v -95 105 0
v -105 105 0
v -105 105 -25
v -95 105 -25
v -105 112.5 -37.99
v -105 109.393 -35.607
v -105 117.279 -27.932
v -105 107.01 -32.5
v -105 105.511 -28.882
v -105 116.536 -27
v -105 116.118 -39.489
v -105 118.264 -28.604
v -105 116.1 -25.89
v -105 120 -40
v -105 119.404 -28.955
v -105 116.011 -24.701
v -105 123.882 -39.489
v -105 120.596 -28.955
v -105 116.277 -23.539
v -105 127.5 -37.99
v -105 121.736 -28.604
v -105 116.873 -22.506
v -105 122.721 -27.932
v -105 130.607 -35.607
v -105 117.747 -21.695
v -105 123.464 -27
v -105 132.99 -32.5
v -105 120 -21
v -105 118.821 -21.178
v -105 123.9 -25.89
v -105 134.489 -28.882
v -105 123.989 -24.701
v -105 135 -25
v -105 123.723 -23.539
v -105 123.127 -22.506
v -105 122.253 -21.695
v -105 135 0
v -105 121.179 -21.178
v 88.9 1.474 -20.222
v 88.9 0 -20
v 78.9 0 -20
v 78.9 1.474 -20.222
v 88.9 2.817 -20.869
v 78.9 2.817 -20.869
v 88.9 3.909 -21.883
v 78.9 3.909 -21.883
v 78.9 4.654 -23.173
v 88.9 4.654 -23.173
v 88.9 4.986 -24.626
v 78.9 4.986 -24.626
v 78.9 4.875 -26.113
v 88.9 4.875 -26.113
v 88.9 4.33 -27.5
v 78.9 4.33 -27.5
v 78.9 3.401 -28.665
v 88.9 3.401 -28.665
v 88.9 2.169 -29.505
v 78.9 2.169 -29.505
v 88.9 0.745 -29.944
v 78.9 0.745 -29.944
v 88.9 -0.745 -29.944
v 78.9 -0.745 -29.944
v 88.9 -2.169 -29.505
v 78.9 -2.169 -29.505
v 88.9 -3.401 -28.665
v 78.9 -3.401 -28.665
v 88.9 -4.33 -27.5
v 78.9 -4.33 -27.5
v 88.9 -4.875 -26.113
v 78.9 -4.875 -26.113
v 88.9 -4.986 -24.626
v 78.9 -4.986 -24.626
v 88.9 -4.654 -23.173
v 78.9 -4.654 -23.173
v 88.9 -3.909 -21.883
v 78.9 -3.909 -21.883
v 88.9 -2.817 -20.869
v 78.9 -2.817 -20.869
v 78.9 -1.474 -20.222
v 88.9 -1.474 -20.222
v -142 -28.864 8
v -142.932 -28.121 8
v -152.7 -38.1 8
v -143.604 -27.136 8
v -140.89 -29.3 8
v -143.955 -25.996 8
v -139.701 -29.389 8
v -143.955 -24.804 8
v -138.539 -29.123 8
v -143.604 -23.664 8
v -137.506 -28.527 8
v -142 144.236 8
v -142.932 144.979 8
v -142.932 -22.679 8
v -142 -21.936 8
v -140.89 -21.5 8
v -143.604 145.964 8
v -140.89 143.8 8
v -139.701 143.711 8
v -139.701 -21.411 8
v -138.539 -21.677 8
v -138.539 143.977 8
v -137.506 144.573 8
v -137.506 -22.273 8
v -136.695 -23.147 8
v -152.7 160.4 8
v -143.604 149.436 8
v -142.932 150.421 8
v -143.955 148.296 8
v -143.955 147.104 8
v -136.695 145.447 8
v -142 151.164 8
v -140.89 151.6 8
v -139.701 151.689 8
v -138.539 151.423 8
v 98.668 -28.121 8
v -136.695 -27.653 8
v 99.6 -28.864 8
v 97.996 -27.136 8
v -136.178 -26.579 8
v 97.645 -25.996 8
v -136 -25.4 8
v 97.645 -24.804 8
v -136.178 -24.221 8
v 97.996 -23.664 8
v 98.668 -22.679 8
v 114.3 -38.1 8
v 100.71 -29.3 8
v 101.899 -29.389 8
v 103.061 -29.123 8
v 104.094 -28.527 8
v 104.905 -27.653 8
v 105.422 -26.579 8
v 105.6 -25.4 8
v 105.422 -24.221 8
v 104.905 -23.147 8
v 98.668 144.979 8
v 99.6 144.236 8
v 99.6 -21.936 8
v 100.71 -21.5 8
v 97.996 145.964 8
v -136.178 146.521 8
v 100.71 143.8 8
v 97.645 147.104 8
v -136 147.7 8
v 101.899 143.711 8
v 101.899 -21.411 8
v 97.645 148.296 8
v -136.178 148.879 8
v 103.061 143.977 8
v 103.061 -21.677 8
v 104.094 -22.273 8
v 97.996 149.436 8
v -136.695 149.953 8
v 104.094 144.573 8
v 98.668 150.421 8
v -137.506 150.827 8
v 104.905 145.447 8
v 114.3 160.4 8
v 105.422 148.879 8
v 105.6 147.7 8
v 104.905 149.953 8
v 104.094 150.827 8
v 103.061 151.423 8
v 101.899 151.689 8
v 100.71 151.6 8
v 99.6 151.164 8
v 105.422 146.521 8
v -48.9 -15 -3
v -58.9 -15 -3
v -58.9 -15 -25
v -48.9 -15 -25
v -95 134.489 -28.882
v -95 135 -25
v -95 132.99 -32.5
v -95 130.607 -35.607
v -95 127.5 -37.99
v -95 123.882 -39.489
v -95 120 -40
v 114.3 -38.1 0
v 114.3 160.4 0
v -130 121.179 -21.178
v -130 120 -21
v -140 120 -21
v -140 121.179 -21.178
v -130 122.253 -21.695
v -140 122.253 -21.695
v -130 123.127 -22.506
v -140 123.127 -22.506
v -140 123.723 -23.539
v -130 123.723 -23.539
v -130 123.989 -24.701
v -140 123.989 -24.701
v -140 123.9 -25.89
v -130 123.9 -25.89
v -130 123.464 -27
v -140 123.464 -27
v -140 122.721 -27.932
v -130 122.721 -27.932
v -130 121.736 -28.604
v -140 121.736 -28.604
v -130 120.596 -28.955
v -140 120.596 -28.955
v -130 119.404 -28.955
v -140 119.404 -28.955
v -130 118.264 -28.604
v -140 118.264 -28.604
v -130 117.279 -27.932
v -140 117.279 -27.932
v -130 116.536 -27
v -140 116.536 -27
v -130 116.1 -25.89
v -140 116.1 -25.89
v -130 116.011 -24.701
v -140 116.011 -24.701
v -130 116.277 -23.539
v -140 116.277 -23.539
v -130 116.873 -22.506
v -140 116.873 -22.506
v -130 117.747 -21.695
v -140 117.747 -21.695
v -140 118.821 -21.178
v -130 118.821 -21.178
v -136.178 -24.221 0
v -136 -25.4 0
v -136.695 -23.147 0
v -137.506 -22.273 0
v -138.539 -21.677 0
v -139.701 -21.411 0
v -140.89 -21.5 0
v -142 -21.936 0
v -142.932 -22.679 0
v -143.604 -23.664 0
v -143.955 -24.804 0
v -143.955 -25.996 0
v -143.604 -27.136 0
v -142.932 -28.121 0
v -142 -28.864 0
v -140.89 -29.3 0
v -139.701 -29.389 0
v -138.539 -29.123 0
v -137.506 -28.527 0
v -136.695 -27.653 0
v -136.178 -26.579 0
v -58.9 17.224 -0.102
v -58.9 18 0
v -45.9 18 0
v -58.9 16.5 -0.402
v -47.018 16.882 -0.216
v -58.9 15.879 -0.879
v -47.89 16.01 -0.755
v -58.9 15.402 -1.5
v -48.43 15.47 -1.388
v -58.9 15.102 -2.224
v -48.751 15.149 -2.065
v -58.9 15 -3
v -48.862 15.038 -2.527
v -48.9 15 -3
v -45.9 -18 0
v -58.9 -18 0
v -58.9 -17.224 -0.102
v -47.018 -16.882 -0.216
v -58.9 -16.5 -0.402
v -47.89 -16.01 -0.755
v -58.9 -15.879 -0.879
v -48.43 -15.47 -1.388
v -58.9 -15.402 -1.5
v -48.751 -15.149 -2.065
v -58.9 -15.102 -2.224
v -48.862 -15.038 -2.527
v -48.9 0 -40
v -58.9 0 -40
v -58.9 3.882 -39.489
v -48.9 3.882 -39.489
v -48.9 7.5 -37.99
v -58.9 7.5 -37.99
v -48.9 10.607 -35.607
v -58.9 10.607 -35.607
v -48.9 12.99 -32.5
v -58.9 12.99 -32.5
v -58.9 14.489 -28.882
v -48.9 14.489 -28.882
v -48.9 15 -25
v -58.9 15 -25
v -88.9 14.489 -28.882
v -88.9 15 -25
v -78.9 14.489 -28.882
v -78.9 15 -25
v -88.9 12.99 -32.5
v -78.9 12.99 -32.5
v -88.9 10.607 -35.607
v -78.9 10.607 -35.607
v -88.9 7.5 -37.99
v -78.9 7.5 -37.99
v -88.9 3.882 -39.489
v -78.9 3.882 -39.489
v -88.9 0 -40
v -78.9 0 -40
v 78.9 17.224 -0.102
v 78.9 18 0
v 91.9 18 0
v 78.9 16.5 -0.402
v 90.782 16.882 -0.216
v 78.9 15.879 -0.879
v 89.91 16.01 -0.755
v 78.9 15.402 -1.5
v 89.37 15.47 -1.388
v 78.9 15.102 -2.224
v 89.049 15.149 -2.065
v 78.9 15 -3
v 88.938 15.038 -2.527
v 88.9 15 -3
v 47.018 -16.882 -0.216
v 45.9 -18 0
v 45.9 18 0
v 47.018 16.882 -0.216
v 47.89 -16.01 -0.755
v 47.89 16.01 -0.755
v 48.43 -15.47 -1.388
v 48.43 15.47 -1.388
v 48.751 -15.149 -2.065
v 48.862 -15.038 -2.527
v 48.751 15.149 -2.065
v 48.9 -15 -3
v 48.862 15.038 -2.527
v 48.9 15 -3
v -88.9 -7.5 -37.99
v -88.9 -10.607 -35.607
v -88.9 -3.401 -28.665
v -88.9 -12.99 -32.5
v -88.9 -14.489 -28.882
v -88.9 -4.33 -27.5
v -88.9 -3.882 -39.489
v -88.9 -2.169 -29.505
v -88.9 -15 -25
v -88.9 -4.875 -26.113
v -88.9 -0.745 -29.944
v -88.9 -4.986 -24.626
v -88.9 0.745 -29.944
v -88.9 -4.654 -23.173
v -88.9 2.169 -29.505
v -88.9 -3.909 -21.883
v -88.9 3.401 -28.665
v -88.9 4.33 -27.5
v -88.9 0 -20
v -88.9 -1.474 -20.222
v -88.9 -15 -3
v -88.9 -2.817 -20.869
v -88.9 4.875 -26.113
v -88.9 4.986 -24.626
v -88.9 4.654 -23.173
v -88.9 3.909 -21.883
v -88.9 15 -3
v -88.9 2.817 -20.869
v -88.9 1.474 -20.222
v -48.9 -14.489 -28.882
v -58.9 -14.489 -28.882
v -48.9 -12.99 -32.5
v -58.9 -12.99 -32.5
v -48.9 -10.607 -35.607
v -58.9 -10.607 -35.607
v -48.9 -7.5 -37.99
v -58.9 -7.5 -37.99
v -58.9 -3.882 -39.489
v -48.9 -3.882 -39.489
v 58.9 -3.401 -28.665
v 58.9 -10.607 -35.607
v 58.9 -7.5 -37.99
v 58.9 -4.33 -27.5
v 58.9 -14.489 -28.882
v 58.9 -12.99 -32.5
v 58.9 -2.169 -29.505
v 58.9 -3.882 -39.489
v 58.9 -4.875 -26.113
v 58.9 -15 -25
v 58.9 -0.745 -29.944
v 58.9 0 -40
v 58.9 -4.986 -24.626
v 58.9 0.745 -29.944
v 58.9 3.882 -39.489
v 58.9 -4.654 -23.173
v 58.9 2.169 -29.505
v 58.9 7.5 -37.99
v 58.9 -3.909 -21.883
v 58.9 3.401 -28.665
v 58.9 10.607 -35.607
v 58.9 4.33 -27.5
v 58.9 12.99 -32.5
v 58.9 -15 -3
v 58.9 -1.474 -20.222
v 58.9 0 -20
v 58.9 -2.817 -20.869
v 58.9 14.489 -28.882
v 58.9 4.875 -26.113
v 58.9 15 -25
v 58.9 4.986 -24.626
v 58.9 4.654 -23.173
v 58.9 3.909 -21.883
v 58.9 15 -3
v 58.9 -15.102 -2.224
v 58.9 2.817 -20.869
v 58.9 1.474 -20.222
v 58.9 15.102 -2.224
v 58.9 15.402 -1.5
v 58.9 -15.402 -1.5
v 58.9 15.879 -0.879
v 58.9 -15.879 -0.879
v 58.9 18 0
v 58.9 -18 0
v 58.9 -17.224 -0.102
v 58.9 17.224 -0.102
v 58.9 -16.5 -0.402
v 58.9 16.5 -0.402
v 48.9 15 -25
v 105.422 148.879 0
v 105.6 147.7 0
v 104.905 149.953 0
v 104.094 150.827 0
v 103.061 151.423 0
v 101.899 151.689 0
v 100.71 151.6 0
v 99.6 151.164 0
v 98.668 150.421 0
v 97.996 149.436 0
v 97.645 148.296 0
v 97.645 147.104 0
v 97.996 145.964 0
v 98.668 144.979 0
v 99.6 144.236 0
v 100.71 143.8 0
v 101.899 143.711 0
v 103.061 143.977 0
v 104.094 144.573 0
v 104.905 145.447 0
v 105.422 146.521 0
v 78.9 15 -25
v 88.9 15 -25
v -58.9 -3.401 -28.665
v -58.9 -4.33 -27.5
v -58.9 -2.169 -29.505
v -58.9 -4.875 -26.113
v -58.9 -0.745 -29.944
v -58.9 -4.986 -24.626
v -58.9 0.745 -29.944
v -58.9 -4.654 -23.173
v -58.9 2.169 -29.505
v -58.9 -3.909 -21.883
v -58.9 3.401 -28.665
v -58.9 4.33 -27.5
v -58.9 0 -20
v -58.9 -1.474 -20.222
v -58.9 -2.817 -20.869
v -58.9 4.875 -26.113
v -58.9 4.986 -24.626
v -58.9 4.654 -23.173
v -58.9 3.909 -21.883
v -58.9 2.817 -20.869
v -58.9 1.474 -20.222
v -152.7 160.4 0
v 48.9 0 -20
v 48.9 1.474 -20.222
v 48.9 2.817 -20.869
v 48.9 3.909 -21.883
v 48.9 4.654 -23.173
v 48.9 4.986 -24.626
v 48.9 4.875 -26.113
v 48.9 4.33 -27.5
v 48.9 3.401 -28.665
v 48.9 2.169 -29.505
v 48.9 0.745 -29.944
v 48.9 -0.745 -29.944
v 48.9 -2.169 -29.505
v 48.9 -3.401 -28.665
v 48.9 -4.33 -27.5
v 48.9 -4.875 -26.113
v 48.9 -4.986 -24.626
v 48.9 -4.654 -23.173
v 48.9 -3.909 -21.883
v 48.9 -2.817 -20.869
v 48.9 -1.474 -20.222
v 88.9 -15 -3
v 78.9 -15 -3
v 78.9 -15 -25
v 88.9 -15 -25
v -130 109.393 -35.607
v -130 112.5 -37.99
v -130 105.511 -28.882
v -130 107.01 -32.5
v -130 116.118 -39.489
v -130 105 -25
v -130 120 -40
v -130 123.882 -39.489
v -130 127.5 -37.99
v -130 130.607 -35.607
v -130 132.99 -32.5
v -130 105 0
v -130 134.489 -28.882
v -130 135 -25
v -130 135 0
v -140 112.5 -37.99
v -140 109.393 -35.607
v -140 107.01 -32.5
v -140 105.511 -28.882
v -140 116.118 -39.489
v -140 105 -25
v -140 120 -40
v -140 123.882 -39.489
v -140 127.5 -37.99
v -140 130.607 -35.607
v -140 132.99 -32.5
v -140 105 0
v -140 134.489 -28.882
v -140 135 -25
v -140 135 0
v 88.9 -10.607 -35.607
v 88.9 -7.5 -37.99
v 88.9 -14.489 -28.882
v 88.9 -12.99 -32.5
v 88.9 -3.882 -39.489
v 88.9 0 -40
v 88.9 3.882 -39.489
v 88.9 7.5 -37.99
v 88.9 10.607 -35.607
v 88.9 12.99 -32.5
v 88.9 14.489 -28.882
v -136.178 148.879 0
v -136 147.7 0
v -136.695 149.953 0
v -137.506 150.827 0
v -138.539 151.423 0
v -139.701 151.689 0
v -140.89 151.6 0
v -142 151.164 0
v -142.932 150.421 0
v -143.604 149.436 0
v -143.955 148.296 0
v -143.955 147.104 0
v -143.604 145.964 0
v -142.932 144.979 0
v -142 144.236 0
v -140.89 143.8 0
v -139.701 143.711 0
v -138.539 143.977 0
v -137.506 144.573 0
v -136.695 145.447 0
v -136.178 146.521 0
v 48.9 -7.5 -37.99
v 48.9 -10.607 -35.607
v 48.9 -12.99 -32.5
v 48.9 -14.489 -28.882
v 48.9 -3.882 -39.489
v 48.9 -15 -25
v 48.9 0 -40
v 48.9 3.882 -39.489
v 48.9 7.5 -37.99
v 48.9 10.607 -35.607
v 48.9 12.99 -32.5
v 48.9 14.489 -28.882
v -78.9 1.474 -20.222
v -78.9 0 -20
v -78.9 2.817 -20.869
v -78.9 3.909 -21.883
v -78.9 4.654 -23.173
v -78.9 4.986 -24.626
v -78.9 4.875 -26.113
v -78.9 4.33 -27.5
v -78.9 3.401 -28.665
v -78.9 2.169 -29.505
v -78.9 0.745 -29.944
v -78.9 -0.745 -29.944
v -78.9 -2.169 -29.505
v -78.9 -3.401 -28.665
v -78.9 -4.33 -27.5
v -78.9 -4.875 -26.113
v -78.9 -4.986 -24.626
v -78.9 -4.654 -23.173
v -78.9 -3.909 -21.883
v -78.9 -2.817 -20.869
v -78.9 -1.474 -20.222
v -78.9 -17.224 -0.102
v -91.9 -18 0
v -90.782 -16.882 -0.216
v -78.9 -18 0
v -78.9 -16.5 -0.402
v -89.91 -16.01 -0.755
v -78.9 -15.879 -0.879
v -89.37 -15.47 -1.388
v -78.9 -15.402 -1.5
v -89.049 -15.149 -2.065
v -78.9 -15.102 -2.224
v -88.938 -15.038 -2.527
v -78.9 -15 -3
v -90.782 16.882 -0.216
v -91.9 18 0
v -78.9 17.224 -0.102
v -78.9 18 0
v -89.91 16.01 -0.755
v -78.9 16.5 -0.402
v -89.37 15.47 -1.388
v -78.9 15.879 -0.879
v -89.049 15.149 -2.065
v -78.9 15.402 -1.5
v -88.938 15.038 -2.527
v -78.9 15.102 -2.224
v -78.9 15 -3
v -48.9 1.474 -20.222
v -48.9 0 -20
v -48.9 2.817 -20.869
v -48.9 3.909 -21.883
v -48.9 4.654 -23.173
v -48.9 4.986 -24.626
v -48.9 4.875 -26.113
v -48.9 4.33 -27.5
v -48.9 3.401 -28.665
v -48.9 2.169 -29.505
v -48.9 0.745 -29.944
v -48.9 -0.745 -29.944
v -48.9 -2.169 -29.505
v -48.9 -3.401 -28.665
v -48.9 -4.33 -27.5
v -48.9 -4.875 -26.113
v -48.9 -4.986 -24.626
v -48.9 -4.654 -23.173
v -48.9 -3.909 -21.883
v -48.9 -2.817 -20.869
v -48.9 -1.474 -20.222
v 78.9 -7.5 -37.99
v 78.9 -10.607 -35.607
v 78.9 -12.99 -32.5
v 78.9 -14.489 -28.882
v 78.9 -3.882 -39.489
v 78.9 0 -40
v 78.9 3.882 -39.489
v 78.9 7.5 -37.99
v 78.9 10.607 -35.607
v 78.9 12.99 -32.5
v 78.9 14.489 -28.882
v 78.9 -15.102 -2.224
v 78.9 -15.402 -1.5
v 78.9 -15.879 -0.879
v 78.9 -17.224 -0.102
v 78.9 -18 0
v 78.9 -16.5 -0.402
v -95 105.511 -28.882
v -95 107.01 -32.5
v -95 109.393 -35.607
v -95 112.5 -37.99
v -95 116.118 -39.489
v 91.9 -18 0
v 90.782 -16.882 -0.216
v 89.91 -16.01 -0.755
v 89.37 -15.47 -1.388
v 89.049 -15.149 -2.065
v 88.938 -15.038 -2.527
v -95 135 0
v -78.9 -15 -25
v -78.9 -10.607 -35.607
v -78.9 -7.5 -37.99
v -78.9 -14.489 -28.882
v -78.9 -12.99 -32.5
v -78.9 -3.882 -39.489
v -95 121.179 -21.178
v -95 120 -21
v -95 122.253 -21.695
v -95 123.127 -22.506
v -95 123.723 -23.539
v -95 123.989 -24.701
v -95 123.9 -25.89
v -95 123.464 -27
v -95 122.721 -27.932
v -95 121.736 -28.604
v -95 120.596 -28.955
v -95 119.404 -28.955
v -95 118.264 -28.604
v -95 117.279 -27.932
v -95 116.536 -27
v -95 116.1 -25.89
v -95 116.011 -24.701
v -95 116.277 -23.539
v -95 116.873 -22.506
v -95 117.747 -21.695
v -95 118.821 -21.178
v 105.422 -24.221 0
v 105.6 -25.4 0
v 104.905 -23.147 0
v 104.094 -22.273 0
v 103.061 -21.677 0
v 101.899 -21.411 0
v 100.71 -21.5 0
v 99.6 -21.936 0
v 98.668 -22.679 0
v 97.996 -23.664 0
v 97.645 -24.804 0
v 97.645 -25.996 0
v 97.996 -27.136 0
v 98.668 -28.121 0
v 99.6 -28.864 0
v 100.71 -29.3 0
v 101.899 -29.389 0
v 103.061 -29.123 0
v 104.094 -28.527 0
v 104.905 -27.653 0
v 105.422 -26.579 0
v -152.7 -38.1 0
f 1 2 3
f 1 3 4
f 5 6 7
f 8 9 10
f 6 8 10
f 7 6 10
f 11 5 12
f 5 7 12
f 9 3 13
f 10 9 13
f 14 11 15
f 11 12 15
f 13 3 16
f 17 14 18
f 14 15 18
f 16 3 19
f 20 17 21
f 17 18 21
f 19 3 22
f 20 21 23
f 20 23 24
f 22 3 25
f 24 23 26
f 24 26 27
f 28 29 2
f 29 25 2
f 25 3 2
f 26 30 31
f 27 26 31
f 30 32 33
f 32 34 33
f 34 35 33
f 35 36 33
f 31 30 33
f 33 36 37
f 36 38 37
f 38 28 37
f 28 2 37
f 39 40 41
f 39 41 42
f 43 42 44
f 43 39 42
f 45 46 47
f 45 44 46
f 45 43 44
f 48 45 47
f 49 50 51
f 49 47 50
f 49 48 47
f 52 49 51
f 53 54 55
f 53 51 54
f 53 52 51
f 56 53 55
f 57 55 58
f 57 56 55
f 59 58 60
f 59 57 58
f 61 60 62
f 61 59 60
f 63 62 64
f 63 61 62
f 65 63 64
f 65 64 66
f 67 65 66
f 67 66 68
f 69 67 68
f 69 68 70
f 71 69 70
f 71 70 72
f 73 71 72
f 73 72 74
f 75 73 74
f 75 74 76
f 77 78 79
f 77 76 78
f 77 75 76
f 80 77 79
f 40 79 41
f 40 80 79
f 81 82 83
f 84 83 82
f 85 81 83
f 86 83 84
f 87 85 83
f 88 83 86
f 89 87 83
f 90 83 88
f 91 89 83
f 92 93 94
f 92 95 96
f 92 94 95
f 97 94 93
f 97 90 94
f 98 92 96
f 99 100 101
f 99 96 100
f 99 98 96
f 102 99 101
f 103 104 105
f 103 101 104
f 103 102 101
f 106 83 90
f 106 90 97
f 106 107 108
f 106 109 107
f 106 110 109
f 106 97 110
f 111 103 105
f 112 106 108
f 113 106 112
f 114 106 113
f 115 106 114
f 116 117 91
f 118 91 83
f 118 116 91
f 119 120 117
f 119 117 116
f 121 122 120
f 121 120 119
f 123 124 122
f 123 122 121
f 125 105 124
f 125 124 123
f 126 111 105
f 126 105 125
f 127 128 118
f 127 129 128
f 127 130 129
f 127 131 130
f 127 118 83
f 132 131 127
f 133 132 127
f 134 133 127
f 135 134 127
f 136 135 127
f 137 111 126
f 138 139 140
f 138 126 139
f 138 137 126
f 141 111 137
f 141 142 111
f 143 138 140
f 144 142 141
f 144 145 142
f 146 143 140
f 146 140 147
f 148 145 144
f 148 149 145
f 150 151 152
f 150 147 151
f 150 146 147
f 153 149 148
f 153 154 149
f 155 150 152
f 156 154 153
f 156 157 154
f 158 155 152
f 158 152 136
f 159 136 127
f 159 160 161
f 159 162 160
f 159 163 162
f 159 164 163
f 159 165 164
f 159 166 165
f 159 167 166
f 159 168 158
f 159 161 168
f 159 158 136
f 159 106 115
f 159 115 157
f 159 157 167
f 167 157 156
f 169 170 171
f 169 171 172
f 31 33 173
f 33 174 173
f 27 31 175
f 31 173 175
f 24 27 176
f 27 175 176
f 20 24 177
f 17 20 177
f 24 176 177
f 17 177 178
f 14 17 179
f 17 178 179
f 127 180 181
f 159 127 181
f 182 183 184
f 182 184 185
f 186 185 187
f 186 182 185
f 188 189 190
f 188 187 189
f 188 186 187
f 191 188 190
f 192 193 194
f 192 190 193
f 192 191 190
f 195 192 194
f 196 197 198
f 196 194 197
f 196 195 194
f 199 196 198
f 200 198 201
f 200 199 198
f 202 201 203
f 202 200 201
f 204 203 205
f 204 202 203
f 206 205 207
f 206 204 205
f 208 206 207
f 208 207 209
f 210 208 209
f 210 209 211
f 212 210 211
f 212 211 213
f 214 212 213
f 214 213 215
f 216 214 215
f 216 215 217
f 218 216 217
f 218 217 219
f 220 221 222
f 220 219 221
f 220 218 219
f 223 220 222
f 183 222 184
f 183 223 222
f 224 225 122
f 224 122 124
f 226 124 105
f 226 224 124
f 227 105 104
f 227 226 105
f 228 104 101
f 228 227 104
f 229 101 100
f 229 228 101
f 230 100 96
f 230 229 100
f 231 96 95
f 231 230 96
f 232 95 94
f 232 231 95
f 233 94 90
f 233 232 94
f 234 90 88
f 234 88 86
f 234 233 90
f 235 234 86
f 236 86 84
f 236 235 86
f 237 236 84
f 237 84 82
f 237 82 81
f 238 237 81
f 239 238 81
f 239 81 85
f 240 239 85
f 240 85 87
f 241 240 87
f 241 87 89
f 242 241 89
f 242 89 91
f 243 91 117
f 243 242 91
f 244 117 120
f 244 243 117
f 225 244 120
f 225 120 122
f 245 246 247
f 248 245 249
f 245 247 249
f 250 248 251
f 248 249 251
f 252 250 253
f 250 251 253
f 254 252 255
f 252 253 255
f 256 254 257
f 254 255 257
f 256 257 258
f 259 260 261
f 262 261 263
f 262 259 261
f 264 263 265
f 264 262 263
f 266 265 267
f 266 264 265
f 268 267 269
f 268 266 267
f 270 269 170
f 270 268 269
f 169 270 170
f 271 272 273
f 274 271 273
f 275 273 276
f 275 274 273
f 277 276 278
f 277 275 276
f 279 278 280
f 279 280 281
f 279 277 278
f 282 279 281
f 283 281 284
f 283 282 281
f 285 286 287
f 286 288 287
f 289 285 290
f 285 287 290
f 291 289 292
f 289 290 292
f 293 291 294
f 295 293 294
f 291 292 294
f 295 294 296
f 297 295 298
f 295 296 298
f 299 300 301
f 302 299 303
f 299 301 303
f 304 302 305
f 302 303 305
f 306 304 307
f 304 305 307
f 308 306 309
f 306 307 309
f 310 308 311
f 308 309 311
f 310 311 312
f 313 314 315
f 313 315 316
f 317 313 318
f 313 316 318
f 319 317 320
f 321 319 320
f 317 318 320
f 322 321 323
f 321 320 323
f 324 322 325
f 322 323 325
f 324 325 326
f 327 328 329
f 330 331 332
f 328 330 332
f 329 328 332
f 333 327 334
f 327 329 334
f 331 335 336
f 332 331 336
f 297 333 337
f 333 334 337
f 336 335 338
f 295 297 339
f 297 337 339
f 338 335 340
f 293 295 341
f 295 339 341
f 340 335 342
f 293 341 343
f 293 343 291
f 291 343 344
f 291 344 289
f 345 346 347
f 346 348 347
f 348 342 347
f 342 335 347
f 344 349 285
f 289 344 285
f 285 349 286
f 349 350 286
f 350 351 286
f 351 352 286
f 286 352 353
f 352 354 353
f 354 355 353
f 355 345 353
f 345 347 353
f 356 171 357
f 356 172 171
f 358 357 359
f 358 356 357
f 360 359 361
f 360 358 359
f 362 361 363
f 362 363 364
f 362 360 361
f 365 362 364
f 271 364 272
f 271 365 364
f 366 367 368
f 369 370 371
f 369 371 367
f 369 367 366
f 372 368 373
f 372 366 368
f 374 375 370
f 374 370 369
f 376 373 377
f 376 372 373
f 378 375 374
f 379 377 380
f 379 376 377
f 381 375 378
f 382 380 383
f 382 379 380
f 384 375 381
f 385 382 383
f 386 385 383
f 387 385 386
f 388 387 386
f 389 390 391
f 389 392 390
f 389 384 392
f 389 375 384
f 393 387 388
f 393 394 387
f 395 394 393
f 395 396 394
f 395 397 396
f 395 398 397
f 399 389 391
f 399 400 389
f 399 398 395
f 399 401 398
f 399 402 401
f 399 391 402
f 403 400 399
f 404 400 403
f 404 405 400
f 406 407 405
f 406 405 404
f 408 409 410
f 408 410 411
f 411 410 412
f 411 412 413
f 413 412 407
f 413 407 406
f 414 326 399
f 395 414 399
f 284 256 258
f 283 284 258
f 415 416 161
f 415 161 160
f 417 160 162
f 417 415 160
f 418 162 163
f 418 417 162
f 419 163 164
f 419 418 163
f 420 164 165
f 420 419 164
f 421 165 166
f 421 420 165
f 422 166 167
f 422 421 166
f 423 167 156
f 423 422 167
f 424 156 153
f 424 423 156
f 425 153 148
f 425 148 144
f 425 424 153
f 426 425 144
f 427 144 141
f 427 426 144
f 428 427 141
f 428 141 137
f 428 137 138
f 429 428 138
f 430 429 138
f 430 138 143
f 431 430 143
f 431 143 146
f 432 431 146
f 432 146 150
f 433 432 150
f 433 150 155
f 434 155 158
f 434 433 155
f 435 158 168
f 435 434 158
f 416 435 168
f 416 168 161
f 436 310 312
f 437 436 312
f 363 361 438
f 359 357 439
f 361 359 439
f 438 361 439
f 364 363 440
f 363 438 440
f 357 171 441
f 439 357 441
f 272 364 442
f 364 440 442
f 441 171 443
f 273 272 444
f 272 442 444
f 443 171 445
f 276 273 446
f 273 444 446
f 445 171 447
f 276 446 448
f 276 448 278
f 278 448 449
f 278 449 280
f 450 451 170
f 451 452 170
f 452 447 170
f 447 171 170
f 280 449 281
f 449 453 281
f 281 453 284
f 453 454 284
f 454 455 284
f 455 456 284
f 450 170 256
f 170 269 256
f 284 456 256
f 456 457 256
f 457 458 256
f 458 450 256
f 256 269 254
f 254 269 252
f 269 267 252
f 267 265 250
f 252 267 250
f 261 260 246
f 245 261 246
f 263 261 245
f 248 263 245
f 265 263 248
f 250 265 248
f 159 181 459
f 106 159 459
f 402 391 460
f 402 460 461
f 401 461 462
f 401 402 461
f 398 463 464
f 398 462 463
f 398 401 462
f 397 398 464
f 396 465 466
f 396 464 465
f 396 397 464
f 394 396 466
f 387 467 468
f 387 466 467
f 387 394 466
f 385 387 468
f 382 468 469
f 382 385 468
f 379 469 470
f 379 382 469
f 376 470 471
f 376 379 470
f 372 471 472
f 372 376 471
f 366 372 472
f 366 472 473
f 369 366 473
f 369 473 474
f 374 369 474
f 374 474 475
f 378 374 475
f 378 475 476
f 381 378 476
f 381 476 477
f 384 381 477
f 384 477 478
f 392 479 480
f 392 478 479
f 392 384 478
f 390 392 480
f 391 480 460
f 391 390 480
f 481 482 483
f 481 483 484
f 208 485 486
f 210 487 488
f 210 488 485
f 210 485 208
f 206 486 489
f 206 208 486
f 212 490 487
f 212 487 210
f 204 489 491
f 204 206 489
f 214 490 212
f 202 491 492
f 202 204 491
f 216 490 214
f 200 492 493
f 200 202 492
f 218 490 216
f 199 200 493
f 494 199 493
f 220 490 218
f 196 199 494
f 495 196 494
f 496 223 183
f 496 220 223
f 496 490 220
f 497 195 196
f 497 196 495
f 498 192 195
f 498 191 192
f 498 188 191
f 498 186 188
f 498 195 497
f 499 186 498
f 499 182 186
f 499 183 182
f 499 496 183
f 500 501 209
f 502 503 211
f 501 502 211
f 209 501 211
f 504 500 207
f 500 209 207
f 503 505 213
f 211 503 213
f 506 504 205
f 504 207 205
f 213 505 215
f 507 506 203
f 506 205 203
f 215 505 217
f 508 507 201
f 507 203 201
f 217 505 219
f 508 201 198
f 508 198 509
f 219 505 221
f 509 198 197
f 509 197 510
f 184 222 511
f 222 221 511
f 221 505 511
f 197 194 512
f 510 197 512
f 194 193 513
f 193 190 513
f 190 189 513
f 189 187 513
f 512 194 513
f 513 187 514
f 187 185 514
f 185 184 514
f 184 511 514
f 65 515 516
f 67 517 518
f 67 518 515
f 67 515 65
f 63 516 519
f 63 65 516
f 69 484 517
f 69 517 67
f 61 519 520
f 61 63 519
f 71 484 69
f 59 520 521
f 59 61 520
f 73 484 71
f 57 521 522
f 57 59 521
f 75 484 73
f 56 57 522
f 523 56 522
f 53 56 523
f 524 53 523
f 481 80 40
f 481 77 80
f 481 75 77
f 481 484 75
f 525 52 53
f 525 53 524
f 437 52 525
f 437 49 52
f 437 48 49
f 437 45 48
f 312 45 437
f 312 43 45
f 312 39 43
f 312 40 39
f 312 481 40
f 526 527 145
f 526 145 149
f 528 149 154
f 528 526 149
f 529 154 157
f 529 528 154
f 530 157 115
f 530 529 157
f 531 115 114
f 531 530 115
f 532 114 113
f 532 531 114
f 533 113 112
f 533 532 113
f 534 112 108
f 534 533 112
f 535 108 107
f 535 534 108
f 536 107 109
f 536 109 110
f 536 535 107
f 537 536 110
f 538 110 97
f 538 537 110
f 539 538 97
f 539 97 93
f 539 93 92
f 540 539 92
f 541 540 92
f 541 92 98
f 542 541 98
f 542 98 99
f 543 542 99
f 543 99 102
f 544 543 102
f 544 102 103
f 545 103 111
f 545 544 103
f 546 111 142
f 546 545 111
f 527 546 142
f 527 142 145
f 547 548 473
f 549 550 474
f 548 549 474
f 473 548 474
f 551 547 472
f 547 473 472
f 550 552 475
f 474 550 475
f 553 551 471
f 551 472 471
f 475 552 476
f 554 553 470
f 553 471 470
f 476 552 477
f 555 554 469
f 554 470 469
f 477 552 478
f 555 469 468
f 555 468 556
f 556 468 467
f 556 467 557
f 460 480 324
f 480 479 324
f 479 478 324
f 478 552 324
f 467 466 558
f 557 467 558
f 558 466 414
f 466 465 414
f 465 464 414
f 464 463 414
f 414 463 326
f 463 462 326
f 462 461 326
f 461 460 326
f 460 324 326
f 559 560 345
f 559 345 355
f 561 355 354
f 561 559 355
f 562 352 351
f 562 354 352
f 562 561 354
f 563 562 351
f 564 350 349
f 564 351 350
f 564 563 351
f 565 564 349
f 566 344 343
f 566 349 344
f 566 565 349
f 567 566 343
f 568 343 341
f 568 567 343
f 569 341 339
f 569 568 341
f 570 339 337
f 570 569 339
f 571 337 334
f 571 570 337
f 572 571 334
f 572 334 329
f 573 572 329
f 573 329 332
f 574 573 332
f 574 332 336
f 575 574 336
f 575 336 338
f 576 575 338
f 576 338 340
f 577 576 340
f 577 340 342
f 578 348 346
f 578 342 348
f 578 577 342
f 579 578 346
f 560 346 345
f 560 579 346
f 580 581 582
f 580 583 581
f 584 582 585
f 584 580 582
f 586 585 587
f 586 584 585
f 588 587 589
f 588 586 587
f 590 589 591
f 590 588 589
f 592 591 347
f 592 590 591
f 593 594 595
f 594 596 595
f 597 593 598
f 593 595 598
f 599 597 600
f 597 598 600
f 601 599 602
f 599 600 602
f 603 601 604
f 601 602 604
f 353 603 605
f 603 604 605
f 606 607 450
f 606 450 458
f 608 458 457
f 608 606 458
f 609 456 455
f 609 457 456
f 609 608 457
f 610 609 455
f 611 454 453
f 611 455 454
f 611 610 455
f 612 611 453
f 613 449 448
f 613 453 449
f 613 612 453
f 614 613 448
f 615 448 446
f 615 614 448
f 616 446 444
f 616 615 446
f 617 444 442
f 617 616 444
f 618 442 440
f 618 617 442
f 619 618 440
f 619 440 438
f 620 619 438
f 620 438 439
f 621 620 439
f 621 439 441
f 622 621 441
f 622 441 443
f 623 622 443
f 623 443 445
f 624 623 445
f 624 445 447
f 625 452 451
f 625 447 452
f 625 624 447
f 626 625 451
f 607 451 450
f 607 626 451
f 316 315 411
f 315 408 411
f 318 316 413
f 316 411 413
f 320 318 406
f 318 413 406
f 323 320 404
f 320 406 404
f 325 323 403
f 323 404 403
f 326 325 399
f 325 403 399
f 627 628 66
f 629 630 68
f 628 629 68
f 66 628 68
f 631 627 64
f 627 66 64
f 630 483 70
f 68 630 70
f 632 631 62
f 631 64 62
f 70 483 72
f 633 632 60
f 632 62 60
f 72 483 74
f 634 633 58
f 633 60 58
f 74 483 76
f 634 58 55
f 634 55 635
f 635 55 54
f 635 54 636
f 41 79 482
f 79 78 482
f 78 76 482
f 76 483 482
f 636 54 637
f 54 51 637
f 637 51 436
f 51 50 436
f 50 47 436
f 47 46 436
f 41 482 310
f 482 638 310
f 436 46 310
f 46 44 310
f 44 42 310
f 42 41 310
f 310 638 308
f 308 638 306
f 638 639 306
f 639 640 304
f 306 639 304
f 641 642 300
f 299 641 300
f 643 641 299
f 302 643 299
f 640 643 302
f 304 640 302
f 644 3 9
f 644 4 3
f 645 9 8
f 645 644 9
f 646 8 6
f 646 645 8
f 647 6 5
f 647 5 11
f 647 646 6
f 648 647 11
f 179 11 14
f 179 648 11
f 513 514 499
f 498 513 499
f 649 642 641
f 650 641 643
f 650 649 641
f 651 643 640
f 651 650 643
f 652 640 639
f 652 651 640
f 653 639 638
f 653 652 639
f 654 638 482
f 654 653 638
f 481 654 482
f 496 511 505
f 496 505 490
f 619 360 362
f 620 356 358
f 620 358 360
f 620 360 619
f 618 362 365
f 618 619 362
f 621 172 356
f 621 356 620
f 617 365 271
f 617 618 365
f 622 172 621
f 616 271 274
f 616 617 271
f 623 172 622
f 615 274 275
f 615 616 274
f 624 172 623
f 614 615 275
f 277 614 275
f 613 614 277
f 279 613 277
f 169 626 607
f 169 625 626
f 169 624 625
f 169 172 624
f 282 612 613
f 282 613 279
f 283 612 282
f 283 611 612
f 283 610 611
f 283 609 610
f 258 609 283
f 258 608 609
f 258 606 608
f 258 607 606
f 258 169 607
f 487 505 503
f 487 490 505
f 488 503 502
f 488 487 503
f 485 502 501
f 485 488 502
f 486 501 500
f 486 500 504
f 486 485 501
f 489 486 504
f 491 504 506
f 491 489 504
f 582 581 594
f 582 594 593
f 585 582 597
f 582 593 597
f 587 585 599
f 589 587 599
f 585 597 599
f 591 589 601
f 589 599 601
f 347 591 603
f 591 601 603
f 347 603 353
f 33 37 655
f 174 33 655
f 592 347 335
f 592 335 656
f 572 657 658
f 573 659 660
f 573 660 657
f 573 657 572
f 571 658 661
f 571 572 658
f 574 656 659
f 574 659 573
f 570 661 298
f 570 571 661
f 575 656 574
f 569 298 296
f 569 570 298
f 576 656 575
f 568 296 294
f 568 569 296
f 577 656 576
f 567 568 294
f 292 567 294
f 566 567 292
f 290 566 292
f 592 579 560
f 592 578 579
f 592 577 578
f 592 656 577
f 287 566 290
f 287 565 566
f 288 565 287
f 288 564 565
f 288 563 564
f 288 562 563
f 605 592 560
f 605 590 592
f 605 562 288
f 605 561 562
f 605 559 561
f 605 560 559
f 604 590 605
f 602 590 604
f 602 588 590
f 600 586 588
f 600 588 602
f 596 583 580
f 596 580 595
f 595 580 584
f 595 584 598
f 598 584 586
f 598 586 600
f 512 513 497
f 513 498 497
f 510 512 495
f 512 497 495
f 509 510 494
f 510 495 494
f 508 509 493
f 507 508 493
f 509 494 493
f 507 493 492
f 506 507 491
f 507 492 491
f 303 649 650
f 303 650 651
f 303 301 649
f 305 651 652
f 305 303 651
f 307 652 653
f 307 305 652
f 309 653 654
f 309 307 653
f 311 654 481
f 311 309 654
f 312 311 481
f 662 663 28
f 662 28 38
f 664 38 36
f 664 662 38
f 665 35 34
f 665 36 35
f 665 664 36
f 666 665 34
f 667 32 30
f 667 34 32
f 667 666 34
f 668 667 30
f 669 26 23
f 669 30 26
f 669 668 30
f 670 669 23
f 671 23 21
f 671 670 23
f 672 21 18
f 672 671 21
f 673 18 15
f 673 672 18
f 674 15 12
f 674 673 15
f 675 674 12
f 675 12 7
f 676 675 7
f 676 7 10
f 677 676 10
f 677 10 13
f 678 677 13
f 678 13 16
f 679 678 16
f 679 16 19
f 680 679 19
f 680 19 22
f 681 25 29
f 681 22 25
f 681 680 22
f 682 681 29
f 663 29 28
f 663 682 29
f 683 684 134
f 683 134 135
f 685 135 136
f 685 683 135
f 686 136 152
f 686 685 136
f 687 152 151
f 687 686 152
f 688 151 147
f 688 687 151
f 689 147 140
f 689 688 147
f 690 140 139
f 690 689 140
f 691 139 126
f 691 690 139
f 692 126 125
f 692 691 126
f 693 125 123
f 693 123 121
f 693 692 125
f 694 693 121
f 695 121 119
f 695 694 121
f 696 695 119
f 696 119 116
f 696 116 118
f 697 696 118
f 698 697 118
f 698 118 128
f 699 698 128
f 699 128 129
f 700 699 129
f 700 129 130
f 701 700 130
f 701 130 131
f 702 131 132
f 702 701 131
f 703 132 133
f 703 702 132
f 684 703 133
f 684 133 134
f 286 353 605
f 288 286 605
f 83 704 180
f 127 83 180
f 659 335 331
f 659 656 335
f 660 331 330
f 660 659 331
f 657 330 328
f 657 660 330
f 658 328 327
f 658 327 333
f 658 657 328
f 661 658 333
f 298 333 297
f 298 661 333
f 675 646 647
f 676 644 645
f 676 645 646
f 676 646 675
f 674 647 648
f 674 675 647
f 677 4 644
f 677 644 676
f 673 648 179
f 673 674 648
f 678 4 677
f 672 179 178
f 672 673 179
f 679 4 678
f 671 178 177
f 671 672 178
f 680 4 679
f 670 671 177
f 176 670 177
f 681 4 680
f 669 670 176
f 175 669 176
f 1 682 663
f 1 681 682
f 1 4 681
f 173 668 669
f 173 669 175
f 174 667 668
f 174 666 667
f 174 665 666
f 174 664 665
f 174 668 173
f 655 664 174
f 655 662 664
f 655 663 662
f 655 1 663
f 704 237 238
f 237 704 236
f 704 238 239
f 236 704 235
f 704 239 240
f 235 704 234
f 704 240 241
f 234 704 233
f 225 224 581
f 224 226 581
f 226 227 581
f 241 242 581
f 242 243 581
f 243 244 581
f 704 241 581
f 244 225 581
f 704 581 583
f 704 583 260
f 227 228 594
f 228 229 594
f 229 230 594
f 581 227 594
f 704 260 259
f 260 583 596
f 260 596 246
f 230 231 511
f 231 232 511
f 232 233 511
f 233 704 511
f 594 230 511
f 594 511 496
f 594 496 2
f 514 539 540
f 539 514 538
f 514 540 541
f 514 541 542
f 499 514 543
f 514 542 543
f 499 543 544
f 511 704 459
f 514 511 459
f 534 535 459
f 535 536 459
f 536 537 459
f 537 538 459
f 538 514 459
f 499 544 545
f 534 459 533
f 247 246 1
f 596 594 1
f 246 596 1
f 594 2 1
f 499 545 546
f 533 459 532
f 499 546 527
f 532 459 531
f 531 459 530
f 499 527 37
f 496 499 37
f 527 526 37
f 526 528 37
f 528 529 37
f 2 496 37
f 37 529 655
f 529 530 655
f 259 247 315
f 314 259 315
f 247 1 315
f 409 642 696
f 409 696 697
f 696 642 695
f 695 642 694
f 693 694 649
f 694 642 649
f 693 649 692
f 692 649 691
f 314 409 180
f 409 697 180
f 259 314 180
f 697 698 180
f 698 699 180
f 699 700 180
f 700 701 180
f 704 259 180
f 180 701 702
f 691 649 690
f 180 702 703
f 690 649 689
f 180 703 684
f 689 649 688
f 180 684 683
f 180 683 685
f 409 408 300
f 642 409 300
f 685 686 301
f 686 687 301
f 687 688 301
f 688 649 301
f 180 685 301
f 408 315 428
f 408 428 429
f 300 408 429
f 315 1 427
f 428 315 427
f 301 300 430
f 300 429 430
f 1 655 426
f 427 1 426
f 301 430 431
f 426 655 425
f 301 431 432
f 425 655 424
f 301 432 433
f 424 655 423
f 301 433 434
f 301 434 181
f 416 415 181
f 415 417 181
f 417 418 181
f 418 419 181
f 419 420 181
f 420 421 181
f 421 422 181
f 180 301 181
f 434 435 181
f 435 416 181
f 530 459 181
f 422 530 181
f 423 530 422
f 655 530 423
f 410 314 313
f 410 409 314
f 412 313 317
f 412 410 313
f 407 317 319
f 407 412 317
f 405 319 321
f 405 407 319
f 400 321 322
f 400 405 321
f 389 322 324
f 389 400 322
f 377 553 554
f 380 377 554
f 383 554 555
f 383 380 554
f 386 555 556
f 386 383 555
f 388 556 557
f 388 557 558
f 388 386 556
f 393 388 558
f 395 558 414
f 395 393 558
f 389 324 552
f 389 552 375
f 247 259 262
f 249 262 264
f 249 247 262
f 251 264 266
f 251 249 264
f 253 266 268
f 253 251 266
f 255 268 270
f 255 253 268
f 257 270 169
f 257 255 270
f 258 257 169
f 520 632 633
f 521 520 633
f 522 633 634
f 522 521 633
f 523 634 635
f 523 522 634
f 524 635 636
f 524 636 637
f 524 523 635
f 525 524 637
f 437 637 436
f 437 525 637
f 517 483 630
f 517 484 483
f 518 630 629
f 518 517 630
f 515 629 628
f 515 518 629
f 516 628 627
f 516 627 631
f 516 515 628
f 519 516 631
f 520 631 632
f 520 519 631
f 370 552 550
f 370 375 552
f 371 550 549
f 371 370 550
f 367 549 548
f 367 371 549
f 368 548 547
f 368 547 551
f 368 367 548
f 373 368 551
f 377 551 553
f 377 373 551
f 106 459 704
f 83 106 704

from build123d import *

# Parameters (mm, degrees)
SKETCH1_R               = 4
SKETCH1_W               = 10
SKETCH1_H               = 30
BOSS_EXTRUDE1_DEPTH     = 8
SKETCH1_3_W             = 10
SKETCH1_3_H             = 30
BOSS_EXTRUDE2_DEPTH     = 40
FILLET1_R               = 3
CUT_EXTRUDE1_DEPTH      = 262.951140482
CUT_EXTRUDE1_DEPTH_BACK = 262.951140482
SKETCH2_R               = 5
SKETCH2_R_2             = 4
FILLET2_R               = 15
FILLET3_R               = 15


with BuildPart() as part:
    # Sketch1 → Boss-Extrude1 (new body)
    # profile 1 of 7: a face of its own
    with BuildSketch(Plane.XY):
        Polygon((-152.7, -38.1), (-114.3, -38.1), (114.3, -38.1), (114.3, 38.1), (114.3, 160.4), (-114.3, 160.4), (-152.7, 160.4), align=None)
        with Locations((-140, -25.4)):
            Circle(SKETCH1_R, mode=Mode.SUBTRACT)
        with Locations((-83.9, 0)):
            Rectangle(SKETCH1_W, SKETCH1_H, mode=Mode.SUBTRACT)
        with Locations((-53.9, 0)):
            Rectangle(SKETCH1_W, SKETCH1_H, mode=Mode.SUBTRACT)
        with Locations((101.6, -25.4)):
            Circle(SKETCH1_R, mode=Mode.SUBTRACT)
        with Locations((53.9, 0)):
            Rectangle(SKETCH1_W, SKETCH1_H, mode=Mode.SUBTRACT)
        with Locations((83.9, 0)):
            Rectangle(SKETCH1_W, SKETCH1_H, mode=Mode.SUBTRACT)
        with Locations((-135, 120)):
            Rectangle(SKETCH1_W, SKETCH1_H, mode=Mode.SUBTRACT)
        with Locations((-100, 120)):
            Rectangle(SKETCH1_W, SKETCH1_H, mode=Mode.SUBTRACT)
        with Locations((-140, 147.7)):
            Circle(SKETCH1_R, mode=Mode.SUBTRACT)
        with Locations((101.6, 147.7)):
            Circle(SKETCH1_R, mode=Mode.SUBTRACT)
    # profile 2 of 7: a face of its own
    with BuildSketch(Plane.XY):
        with Locations((-53.9, 0)):
            Rectangle(SKETCH1_W, SKETCH1_H)
    # profile 3 of 7: a face of its own
    with BuildSketch(Plane.XY):
        with Locations((-83.9, 0)):
            Rectangle(SKETCH1_W, SKETCH1_H)
    # profile 4 of 7: a face of its own
    with BuildSketch(Plane.XY):
        with Locations((53.9, 0)):
            Rectangle(SKETCH1_W, SKETCH1_H)
    # profile 5 of 7: a face of its own
    with BuildSketch(Plane.XY):
        with Locations((83.9, 0)):
            Rectangle(SKETCH1_W, SKETCH1_H)
    # profile 6 of 7: a face of its own
    with BuildSketch(Plane.XY):
        with Locations((-100, 120)):
            Rectangle(SKETCH1_W, SKETCH1_H)
    # profile 7 of 7: a face of its own
    with BuildSketch(Plane.XY):
        with Locations((-135, 120)):
            Rectangle(SKETCH1_W, SKETCH1_H)
    extrude(amount=BOSS_EXTRUDE1_DEPTH)

    # Sketch1<3> → Boss-Extrude2 (add)
    with BuildSketch(Plane.XY):
        with Locations((-83.9, 0)):
            Rectangle(SKETCH1_3_W, SKETCH1_3_H)
        with Locations((-53.9, 0)):
            Rectangle(SKETCH1_3_W, SKETCH1_3_H)
        with Locations((83.9, 0)):
            Rectangle(SKETCH1_3_W, SKETCH1_3_H)
        with Locations((53.9, 0)):
            Rectangle(SKETCH1_3_W, SKETCH1_3_H)
        with Locations((-100, 120)):
            Rectangle(SKETCH1_3_W, SKETCH1_3_H)
        with Locations((-135, 120)):
            Rectangle(SKETCH1_3_W, SKETCH1_3_H)
    extrude(amount=-BOSS_EXTRUDE2_DEPTH)

    # Fillet1
    fillet1_edges = [part.edges().sort_by_distance(p)[0] for p in [
        (-83.9, 15, 0),
        (-88.9, 0, 0),
        (-83.9, -15, 0),
        (-48.9, 0, 0),
        (-53.9, 15, 0),
        (-53.9, -15, 0),
        (88.9, 0, 0),
        (83.9, -15, 0),
        (83.9, 15, 0),
        (53.9, -15, 0),
        (53.9, 15, 0),
        (48.9, 0, 0),
    ]]
    fillet(fillet1_edges, radius=FILLET1_R)

    # Sketch2 → Cut-Extrude1 (cut, two sides: drawn at the far end of the back side and taken through both)
    with BuildSketch(Plane.ZY.offset(88.9).offset(-CUT_EXTRUDE1_DEPTH_BACK)):
        with Locations((-25, 0)):
            Circle(SKETCH2_R)
        with Locations((-25, 120)):
            Circle(SKETCH2_R_2)
    extrude(amount=CUT_EXTRUDE1_DEPTH + CUT_EXTRUDE1_DEPTH_BACK, mode=Mode.SUBTRACT)

    # Fillet2
    fillet2_edges = [part.edges().sort_by_distance(p)[0] for p in [
        (53.9, 15, -40),
        (53.9, -15, -40),
        (83.9, 15, -40),
        (83.9, -15, -40),
        (-53.9, 15, -40),
        (-53.9, -15, -40),
        (-83.9, -15, -40),
        (-83.9, 15, -40),
    ]]
    fillet(fillet2_edges, radius=FILLET2_R - 0.0001)  # a hair under: the kernel refuses the full size

    # Fillet3
    fillet3_edges = [part.edges().sort_by_distance(p)[0] for p in [
        (-135, 135, -40),
        (-135, 105, -40),
        (-100, 105, -40),
        (-100, 135, -40),
    ]]
    fillet(fillet3_edges, radius=FILLET3_R - 0.0001)  # a hair under: the kernel refuses the full size


solid = part.part
